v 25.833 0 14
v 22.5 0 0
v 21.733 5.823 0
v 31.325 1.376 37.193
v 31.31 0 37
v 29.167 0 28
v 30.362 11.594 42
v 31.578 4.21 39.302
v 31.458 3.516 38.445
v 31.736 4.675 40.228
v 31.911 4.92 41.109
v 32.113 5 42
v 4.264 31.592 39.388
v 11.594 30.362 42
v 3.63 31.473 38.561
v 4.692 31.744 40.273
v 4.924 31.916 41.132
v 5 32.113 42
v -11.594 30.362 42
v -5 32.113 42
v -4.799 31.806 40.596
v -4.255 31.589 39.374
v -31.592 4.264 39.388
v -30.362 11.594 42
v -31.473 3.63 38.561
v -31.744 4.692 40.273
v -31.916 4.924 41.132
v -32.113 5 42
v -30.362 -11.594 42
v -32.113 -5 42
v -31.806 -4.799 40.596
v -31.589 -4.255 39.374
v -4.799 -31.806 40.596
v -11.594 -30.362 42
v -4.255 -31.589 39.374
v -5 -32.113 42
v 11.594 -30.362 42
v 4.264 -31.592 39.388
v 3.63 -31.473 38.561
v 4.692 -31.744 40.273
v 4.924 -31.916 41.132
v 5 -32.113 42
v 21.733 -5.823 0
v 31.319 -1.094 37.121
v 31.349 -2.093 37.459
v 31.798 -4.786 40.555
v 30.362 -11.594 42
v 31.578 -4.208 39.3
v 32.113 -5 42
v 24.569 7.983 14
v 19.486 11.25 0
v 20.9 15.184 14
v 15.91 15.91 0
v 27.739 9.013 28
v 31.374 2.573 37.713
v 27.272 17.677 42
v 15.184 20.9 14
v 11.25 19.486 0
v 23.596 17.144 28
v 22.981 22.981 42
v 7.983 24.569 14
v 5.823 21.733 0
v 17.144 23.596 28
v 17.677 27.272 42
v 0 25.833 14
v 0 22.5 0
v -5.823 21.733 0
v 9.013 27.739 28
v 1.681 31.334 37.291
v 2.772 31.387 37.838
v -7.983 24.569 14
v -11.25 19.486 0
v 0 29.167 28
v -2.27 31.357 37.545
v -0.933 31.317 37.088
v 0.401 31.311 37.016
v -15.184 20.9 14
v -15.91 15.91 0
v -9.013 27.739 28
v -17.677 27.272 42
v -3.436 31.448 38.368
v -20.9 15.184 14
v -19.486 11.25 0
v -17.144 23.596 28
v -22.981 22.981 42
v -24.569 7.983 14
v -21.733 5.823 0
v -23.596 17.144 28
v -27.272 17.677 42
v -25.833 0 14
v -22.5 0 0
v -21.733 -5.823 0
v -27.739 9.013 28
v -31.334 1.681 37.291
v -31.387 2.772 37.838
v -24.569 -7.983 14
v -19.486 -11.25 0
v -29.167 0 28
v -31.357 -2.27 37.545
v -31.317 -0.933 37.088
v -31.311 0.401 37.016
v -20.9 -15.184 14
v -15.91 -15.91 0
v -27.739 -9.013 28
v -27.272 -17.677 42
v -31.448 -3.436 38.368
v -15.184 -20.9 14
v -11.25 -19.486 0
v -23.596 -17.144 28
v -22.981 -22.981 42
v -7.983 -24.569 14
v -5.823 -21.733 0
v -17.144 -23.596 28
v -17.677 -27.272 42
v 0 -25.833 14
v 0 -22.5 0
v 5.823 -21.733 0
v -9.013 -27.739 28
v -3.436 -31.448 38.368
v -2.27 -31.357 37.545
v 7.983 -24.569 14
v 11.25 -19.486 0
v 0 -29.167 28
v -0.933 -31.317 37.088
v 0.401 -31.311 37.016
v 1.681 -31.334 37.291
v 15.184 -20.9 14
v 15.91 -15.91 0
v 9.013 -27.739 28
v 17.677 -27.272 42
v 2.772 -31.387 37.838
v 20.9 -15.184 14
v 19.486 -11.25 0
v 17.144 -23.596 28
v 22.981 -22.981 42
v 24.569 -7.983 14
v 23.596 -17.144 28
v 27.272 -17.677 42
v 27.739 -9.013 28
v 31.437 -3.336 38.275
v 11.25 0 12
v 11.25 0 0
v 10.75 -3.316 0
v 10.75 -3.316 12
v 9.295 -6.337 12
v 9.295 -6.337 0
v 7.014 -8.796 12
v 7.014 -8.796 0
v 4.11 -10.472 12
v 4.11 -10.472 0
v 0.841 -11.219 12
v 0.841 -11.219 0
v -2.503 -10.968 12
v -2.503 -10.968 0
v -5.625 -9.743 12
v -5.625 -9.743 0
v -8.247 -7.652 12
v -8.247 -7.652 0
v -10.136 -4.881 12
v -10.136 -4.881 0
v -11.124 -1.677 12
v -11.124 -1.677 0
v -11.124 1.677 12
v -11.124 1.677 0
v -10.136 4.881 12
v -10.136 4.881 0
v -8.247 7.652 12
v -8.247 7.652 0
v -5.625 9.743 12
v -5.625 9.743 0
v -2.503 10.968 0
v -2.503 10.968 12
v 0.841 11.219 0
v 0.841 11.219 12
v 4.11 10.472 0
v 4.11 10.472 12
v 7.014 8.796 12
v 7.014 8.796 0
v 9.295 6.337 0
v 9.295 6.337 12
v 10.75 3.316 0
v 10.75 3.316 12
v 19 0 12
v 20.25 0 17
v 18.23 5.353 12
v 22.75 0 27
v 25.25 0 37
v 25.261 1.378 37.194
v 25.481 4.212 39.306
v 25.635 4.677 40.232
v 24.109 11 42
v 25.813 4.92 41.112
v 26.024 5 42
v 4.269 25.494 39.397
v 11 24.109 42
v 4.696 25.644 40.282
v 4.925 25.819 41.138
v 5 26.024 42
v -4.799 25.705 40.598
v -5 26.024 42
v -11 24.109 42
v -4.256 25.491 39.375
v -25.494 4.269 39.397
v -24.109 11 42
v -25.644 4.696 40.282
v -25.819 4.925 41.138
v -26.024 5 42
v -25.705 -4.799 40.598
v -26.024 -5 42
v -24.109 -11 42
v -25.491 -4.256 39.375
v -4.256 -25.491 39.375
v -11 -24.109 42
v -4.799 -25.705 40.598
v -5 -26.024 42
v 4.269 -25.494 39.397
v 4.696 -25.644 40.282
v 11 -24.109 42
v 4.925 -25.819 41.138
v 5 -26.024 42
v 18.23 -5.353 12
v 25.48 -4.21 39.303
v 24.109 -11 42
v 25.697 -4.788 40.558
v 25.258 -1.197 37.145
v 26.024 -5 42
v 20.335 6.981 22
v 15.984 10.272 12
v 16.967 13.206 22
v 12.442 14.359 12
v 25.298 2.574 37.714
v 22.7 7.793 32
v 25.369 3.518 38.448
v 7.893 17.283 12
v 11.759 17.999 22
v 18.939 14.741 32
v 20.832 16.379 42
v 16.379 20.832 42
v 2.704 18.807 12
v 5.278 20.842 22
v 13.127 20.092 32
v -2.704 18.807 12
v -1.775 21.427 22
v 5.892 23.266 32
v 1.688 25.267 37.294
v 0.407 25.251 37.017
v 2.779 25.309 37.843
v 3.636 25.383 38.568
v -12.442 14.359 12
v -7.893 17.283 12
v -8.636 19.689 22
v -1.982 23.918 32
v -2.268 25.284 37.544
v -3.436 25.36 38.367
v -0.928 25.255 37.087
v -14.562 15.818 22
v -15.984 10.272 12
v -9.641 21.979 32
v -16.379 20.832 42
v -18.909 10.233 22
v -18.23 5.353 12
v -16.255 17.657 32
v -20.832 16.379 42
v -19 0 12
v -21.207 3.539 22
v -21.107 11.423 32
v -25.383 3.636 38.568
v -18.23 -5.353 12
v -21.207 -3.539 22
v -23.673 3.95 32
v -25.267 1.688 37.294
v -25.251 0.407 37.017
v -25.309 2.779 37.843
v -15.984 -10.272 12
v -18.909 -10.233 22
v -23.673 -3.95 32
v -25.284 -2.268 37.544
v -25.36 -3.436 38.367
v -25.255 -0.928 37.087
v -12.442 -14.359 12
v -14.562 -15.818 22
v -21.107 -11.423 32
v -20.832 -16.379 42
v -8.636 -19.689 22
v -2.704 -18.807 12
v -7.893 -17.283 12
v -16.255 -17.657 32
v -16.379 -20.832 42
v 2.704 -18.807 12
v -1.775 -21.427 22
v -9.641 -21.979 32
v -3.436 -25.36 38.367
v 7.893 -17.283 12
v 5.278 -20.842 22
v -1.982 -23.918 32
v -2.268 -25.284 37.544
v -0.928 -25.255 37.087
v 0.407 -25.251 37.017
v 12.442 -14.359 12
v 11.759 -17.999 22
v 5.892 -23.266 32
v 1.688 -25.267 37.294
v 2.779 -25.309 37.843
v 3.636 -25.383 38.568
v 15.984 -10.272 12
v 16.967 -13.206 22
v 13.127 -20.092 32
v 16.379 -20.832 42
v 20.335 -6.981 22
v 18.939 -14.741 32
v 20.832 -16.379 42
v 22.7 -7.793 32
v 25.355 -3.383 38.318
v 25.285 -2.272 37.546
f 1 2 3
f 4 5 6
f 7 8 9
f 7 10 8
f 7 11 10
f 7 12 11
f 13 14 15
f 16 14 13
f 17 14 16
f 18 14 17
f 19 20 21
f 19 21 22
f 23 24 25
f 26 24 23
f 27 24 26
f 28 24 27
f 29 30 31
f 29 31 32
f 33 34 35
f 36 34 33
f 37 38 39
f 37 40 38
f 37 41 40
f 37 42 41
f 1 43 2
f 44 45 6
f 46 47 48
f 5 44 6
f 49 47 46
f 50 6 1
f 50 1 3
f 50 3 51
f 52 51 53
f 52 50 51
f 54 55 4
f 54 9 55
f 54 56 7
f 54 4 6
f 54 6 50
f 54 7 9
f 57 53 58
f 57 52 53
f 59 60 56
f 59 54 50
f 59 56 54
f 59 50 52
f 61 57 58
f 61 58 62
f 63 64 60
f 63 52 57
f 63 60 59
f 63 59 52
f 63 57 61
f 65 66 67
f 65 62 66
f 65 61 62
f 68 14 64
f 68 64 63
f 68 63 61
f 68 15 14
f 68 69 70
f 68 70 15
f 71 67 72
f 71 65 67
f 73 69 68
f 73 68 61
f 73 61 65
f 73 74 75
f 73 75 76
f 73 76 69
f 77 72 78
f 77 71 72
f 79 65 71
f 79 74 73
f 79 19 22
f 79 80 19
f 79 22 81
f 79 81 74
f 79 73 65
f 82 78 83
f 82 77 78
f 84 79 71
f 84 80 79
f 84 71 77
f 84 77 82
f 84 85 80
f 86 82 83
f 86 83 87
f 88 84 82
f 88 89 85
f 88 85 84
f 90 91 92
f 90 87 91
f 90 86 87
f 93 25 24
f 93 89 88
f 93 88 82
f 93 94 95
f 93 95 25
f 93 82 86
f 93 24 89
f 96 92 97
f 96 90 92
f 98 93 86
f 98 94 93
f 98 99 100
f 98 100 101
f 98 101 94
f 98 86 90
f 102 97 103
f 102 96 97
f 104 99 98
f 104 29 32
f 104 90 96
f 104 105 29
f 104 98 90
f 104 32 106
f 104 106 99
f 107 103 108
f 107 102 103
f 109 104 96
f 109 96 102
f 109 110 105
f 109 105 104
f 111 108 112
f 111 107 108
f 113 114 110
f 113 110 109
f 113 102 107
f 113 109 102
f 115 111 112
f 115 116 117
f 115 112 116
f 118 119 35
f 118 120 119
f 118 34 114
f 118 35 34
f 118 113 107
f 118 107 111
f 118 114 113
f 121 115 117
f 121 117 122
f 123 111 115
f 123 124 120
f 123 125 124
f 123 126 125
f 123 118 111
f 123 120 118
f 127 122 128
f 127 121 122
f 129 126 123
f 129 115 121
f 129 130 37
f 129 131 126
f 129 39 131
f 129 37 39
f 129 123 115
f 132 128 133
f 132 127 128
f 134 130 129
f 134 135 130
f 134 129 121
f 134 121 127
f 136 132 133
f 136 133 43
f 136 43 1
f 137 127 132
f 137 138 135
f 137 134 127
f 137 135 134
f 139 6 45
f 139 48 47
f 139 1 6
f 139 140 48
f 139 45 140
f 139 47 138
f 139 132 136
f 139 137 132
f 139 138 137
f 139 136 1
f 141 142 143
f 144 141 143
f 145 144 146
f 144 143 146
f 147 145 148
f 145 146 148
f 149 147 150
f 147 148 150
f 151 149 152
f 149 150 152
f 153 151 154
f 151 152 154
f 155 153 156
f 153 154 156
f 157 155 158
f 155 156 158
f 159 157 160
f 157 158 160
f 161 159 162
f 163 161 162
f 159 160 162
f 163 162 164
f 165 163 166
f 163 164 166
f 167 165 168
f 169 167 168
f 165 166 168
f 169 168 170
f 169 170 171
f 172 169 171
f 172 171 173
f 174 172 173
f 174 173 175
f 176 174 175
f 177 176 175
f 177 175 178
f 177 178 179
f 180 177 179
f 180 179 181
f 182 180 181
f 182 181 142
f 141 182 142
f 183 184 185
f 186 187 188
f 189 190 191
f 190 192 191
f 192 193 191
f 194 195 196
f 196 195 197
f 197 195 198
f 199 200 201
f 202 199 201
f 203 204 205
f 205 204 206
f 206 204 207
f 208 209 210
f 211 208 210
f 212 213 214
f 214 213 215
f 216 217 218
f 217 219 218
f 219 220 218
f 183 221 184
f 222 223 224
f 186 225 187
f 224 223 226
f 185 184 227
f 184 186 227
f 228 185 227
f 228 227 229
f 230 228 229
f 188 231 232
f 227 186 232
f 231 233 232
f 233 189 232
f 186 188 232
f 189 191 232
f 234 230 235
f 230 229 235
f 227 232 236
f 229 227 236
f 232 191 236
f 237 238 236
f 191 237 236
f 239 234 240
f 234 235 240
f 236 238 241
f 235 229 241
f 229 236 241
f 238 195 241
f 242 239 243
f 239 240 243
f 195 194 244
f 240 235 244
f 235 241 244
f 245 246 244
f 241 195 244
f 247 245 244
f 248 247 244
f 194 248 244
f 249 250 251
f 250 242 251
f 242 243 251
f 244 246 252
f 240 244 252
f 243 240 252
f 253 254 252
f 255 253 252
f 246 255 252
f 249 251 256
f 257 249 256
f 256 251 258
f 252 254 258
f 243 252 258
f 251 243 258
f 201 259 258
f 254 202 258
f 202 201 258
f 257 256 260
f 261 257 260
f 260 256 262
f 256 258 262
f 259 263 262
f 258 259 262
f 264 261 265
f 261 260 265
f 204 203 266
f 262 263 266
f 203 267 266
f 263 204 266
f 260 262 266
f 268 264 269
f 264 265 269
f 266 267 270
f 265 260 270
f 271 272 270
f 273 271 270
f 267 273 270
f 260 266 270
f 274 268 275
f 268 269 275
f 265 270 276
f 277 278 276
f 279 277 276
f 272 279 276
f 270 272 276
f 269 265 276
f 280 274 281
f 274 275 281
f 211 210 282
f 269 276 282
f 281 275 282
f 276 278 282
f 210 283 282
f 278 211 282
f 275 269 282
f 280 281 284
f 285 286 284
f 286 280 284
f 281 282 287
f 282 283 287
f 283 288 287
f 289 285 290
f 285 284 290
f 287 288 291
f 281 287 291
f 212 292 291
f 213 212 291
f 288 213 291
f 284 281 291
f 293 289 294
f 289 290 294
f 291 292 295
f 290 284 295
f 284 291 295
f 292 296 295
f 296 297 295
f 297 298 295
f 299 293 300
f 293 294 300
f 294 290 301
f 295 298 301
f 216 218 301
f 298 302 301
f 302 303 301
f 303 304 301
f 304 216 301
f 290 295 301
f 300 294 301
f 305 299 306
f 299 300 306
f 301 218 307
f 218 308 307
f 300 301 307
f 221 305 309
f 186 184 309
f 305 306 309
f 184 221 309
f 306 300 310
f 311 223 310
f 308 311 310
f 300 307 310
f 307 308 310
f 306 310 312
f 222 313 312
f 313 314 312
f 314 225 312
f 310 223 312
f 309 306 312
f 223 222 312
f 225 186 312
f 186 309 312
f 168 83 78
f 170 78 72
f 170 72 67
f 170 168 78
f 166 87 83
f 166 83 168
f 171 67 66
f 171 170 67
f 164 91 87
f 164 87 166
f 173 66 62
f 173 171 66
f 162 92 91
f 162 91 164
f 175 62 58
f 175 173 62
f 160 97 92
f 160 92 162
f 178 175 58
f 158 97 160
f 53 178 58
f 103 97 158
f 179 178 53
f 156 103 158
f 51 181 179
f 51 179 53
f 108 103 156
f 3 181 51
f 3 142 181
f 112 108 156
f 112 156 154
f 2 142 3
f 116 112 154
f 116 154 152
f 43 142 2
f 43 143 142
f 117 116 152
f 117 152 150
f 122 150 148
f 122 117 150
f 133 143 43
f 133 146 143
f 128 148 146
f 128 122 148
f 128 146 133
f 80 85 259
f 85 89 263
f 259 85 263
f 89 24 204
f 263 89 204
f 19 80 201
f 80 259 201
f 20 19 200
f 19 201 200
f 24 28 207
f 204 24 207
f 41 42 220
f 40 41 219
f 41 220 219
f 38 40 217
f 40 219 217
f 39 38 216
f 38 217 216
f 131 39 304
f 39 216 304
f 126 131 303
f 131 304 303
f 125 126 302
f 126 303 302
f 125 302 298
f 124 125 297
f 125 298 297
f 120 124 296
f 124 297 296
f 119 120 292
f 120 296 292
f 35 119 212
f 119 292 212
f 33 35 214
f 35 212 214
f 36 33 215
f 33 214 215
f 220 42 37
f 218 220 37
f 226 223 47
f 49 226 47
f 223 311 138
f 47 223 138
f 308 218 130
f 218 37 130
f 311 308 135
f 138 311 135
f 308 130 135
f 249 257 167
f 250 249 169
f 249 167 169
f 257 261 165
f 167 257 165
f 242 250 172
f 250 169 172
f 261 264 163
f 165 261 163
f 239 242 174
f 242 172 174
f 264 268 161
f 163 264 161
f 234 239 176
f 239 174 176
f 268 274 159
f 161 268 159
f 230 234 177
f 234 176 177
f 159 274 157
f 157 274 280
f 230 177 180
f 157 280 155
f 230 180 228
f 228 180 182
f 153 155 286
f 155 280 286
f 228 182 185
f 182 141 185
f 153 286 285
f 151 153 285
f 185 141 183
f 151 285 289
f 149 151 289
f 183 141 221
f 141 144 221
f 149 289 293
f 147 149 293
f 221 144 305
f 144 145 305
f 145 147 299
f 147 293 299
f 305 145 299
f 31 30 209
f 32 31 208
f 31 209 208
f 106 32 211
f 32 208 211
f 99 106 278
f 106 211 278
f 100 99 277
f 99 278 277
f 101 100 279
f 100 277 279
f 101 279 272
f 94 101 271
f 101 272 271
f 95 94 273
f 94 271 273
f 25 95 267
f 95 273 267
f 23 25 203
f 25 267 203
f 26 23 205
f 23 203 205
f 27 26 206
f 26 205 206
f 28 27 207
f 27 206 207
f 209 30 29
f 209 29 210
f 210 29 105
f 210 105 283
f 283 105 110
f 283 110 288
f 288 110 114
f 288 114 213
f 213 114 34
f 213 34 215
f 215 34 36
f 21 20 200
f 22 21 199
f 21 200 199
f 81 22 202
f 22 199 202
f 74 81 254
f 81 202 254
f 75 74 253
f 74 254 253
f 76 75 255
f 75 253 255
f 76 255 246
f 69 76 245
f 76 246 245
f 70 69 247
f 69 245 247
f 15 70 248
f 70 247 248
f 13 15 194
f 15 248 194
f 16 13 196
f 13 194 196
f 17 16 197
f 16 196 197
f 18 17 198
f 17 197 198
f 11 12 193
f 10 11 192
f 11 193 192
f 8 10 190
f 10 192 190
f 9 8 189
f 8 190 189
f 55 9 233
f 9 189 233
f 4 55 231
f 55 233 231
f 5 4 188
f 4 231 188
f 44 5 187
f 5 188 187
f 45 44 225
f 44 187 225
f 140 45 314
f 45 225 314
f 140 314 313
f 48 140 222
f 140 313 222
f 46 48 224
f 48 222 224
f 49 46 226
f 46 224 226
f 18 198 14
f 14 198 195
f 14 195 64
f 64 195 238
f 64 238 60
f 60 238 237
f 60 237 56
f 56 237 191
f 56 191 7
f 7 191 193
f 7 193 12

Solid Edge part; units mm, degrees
sketch "Sketch1" plane through (0, 0, 0) normal (0, -1, 0) x (1, 0, 0)
  line L0 (11.25, 0) -> (22.5, 0)
  line L1 (22.5, 0) -> (32.5, 42)
  line L2 (32.5, 42) -> (26.5, 42)
  line L3 (26.5, 42) -> (19, 12)
  line L4 (19, 12) -> (11.25, 12)
  line L5 (11.25, 12) -> (11.25, 0)
  dimension "D1" = 11.25
  dimension "D2" = 22.5
  dimension "D3" = 6
  dimension "D4" = 42
  dimension "D5" = 32.5
  dimension "D6" = 19
  dimension "D7" = 12
revolve "RevolvedProtrusion1" add sketch "Sketch1" angle 360 about axis through (0, 0, 54) along (0, 0, -1)
sketch "Sketch2" plane through (0, 0, 0) normal (0, -1, 0) x (1, 0, 0)
  circle A0 centre (0, 42) radius 5
extrude "Cutout1" cut sketch "Sketch2" along normal mid plane 139.2818
sketch "Sketch3" plane through (0, 0, 0) normal (1, 0, 0) x (0, 1, 0)
  circle A0 centre (0, 42) radius 5
extrude "ExtrudedCutout_2" cut sketch "Sketch3" along normal mid plane 121.6254
properties part number "4" material "CAST STEEL"
